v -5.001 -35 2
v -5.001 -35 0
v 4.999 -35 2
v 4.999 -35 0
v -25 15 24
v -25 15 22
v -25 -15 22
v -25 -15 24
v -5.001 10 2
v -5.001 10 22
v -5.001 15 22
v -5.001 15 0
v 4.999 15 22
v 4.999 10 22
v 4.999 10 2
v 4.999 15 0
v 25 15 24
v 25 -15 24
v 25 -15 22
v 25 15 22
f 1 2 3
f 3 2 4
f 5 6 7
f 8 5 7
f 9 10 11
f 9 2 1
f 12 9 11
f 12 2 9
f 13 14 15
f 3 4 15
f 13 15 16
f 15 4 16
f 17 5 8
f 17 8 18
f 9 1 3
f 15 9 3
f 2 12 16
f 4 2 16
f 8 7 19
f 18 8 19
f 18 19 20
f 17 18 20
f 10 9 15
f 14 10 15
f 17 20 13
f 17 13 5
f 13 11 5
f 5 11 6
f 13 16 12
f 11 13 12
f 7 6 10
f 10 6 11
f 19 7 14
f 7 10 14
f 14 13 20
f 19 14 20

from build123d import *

# Parameters (mm, degrees)
F0_W     = 10
F0_H     = 5
F1_DEPTH = 2
F2_W     = 10
F2_H     = 5
F3_DEPTH = 20
F4_W     = 10
F4_H     = 5
F5_DEPTH = 2


with BuildPart() as f1:
    # F0 (on Top) → F1 (new body)
    with BuildSketch(Plane.XY):
        Polygon((4.999269, -35), (4.999269, -15), (-4.999269, -15), (-5.000731, -15), (-5.000731, -35), align=None)
        Polygon((-4.999269, -15), (4.999269, -15), (4.999269, 10), (-5.000731, 10), (-5.000731, -15), align=None)
        with Locations((-0.000731, 12.5)):
            Rectangle(F0_W, F0_H)
    extrude(amount=F1_DEPTH)

    # F2 (on face) → F3 (join)
    with BuildSketch(Plane.XY.offset(2)):
        with Locations((-0.000731, 12.5)):
            Rectangle(F2_W, F2_H)
    extrude(amount=F3_DEPTH)

    # F4 (on face) → F5 (join)
    with BuildSketch(Plane.XY.offset(22)):
        Polygon((-5.000731, 10), (-5.000731, 15), (-25, 15), (-25, -15), (-5.000731, -15), align=None)
        Polygon((4.999269, -15), (4.999269, 10), (-5.000731, 10), (-5.000731, -15), (-4.999269, -15), align=None)
        with Locations((-0.000731, 12.5)):
            Rectangle(F4_W, F4_H)
        Polygon((25, -15), (25, 15), (4.999269, 15), (4.999269, 10), (4.999269, -15), align=None)
    extrude(amount=F5_DEPTH)


solid = f1.part
